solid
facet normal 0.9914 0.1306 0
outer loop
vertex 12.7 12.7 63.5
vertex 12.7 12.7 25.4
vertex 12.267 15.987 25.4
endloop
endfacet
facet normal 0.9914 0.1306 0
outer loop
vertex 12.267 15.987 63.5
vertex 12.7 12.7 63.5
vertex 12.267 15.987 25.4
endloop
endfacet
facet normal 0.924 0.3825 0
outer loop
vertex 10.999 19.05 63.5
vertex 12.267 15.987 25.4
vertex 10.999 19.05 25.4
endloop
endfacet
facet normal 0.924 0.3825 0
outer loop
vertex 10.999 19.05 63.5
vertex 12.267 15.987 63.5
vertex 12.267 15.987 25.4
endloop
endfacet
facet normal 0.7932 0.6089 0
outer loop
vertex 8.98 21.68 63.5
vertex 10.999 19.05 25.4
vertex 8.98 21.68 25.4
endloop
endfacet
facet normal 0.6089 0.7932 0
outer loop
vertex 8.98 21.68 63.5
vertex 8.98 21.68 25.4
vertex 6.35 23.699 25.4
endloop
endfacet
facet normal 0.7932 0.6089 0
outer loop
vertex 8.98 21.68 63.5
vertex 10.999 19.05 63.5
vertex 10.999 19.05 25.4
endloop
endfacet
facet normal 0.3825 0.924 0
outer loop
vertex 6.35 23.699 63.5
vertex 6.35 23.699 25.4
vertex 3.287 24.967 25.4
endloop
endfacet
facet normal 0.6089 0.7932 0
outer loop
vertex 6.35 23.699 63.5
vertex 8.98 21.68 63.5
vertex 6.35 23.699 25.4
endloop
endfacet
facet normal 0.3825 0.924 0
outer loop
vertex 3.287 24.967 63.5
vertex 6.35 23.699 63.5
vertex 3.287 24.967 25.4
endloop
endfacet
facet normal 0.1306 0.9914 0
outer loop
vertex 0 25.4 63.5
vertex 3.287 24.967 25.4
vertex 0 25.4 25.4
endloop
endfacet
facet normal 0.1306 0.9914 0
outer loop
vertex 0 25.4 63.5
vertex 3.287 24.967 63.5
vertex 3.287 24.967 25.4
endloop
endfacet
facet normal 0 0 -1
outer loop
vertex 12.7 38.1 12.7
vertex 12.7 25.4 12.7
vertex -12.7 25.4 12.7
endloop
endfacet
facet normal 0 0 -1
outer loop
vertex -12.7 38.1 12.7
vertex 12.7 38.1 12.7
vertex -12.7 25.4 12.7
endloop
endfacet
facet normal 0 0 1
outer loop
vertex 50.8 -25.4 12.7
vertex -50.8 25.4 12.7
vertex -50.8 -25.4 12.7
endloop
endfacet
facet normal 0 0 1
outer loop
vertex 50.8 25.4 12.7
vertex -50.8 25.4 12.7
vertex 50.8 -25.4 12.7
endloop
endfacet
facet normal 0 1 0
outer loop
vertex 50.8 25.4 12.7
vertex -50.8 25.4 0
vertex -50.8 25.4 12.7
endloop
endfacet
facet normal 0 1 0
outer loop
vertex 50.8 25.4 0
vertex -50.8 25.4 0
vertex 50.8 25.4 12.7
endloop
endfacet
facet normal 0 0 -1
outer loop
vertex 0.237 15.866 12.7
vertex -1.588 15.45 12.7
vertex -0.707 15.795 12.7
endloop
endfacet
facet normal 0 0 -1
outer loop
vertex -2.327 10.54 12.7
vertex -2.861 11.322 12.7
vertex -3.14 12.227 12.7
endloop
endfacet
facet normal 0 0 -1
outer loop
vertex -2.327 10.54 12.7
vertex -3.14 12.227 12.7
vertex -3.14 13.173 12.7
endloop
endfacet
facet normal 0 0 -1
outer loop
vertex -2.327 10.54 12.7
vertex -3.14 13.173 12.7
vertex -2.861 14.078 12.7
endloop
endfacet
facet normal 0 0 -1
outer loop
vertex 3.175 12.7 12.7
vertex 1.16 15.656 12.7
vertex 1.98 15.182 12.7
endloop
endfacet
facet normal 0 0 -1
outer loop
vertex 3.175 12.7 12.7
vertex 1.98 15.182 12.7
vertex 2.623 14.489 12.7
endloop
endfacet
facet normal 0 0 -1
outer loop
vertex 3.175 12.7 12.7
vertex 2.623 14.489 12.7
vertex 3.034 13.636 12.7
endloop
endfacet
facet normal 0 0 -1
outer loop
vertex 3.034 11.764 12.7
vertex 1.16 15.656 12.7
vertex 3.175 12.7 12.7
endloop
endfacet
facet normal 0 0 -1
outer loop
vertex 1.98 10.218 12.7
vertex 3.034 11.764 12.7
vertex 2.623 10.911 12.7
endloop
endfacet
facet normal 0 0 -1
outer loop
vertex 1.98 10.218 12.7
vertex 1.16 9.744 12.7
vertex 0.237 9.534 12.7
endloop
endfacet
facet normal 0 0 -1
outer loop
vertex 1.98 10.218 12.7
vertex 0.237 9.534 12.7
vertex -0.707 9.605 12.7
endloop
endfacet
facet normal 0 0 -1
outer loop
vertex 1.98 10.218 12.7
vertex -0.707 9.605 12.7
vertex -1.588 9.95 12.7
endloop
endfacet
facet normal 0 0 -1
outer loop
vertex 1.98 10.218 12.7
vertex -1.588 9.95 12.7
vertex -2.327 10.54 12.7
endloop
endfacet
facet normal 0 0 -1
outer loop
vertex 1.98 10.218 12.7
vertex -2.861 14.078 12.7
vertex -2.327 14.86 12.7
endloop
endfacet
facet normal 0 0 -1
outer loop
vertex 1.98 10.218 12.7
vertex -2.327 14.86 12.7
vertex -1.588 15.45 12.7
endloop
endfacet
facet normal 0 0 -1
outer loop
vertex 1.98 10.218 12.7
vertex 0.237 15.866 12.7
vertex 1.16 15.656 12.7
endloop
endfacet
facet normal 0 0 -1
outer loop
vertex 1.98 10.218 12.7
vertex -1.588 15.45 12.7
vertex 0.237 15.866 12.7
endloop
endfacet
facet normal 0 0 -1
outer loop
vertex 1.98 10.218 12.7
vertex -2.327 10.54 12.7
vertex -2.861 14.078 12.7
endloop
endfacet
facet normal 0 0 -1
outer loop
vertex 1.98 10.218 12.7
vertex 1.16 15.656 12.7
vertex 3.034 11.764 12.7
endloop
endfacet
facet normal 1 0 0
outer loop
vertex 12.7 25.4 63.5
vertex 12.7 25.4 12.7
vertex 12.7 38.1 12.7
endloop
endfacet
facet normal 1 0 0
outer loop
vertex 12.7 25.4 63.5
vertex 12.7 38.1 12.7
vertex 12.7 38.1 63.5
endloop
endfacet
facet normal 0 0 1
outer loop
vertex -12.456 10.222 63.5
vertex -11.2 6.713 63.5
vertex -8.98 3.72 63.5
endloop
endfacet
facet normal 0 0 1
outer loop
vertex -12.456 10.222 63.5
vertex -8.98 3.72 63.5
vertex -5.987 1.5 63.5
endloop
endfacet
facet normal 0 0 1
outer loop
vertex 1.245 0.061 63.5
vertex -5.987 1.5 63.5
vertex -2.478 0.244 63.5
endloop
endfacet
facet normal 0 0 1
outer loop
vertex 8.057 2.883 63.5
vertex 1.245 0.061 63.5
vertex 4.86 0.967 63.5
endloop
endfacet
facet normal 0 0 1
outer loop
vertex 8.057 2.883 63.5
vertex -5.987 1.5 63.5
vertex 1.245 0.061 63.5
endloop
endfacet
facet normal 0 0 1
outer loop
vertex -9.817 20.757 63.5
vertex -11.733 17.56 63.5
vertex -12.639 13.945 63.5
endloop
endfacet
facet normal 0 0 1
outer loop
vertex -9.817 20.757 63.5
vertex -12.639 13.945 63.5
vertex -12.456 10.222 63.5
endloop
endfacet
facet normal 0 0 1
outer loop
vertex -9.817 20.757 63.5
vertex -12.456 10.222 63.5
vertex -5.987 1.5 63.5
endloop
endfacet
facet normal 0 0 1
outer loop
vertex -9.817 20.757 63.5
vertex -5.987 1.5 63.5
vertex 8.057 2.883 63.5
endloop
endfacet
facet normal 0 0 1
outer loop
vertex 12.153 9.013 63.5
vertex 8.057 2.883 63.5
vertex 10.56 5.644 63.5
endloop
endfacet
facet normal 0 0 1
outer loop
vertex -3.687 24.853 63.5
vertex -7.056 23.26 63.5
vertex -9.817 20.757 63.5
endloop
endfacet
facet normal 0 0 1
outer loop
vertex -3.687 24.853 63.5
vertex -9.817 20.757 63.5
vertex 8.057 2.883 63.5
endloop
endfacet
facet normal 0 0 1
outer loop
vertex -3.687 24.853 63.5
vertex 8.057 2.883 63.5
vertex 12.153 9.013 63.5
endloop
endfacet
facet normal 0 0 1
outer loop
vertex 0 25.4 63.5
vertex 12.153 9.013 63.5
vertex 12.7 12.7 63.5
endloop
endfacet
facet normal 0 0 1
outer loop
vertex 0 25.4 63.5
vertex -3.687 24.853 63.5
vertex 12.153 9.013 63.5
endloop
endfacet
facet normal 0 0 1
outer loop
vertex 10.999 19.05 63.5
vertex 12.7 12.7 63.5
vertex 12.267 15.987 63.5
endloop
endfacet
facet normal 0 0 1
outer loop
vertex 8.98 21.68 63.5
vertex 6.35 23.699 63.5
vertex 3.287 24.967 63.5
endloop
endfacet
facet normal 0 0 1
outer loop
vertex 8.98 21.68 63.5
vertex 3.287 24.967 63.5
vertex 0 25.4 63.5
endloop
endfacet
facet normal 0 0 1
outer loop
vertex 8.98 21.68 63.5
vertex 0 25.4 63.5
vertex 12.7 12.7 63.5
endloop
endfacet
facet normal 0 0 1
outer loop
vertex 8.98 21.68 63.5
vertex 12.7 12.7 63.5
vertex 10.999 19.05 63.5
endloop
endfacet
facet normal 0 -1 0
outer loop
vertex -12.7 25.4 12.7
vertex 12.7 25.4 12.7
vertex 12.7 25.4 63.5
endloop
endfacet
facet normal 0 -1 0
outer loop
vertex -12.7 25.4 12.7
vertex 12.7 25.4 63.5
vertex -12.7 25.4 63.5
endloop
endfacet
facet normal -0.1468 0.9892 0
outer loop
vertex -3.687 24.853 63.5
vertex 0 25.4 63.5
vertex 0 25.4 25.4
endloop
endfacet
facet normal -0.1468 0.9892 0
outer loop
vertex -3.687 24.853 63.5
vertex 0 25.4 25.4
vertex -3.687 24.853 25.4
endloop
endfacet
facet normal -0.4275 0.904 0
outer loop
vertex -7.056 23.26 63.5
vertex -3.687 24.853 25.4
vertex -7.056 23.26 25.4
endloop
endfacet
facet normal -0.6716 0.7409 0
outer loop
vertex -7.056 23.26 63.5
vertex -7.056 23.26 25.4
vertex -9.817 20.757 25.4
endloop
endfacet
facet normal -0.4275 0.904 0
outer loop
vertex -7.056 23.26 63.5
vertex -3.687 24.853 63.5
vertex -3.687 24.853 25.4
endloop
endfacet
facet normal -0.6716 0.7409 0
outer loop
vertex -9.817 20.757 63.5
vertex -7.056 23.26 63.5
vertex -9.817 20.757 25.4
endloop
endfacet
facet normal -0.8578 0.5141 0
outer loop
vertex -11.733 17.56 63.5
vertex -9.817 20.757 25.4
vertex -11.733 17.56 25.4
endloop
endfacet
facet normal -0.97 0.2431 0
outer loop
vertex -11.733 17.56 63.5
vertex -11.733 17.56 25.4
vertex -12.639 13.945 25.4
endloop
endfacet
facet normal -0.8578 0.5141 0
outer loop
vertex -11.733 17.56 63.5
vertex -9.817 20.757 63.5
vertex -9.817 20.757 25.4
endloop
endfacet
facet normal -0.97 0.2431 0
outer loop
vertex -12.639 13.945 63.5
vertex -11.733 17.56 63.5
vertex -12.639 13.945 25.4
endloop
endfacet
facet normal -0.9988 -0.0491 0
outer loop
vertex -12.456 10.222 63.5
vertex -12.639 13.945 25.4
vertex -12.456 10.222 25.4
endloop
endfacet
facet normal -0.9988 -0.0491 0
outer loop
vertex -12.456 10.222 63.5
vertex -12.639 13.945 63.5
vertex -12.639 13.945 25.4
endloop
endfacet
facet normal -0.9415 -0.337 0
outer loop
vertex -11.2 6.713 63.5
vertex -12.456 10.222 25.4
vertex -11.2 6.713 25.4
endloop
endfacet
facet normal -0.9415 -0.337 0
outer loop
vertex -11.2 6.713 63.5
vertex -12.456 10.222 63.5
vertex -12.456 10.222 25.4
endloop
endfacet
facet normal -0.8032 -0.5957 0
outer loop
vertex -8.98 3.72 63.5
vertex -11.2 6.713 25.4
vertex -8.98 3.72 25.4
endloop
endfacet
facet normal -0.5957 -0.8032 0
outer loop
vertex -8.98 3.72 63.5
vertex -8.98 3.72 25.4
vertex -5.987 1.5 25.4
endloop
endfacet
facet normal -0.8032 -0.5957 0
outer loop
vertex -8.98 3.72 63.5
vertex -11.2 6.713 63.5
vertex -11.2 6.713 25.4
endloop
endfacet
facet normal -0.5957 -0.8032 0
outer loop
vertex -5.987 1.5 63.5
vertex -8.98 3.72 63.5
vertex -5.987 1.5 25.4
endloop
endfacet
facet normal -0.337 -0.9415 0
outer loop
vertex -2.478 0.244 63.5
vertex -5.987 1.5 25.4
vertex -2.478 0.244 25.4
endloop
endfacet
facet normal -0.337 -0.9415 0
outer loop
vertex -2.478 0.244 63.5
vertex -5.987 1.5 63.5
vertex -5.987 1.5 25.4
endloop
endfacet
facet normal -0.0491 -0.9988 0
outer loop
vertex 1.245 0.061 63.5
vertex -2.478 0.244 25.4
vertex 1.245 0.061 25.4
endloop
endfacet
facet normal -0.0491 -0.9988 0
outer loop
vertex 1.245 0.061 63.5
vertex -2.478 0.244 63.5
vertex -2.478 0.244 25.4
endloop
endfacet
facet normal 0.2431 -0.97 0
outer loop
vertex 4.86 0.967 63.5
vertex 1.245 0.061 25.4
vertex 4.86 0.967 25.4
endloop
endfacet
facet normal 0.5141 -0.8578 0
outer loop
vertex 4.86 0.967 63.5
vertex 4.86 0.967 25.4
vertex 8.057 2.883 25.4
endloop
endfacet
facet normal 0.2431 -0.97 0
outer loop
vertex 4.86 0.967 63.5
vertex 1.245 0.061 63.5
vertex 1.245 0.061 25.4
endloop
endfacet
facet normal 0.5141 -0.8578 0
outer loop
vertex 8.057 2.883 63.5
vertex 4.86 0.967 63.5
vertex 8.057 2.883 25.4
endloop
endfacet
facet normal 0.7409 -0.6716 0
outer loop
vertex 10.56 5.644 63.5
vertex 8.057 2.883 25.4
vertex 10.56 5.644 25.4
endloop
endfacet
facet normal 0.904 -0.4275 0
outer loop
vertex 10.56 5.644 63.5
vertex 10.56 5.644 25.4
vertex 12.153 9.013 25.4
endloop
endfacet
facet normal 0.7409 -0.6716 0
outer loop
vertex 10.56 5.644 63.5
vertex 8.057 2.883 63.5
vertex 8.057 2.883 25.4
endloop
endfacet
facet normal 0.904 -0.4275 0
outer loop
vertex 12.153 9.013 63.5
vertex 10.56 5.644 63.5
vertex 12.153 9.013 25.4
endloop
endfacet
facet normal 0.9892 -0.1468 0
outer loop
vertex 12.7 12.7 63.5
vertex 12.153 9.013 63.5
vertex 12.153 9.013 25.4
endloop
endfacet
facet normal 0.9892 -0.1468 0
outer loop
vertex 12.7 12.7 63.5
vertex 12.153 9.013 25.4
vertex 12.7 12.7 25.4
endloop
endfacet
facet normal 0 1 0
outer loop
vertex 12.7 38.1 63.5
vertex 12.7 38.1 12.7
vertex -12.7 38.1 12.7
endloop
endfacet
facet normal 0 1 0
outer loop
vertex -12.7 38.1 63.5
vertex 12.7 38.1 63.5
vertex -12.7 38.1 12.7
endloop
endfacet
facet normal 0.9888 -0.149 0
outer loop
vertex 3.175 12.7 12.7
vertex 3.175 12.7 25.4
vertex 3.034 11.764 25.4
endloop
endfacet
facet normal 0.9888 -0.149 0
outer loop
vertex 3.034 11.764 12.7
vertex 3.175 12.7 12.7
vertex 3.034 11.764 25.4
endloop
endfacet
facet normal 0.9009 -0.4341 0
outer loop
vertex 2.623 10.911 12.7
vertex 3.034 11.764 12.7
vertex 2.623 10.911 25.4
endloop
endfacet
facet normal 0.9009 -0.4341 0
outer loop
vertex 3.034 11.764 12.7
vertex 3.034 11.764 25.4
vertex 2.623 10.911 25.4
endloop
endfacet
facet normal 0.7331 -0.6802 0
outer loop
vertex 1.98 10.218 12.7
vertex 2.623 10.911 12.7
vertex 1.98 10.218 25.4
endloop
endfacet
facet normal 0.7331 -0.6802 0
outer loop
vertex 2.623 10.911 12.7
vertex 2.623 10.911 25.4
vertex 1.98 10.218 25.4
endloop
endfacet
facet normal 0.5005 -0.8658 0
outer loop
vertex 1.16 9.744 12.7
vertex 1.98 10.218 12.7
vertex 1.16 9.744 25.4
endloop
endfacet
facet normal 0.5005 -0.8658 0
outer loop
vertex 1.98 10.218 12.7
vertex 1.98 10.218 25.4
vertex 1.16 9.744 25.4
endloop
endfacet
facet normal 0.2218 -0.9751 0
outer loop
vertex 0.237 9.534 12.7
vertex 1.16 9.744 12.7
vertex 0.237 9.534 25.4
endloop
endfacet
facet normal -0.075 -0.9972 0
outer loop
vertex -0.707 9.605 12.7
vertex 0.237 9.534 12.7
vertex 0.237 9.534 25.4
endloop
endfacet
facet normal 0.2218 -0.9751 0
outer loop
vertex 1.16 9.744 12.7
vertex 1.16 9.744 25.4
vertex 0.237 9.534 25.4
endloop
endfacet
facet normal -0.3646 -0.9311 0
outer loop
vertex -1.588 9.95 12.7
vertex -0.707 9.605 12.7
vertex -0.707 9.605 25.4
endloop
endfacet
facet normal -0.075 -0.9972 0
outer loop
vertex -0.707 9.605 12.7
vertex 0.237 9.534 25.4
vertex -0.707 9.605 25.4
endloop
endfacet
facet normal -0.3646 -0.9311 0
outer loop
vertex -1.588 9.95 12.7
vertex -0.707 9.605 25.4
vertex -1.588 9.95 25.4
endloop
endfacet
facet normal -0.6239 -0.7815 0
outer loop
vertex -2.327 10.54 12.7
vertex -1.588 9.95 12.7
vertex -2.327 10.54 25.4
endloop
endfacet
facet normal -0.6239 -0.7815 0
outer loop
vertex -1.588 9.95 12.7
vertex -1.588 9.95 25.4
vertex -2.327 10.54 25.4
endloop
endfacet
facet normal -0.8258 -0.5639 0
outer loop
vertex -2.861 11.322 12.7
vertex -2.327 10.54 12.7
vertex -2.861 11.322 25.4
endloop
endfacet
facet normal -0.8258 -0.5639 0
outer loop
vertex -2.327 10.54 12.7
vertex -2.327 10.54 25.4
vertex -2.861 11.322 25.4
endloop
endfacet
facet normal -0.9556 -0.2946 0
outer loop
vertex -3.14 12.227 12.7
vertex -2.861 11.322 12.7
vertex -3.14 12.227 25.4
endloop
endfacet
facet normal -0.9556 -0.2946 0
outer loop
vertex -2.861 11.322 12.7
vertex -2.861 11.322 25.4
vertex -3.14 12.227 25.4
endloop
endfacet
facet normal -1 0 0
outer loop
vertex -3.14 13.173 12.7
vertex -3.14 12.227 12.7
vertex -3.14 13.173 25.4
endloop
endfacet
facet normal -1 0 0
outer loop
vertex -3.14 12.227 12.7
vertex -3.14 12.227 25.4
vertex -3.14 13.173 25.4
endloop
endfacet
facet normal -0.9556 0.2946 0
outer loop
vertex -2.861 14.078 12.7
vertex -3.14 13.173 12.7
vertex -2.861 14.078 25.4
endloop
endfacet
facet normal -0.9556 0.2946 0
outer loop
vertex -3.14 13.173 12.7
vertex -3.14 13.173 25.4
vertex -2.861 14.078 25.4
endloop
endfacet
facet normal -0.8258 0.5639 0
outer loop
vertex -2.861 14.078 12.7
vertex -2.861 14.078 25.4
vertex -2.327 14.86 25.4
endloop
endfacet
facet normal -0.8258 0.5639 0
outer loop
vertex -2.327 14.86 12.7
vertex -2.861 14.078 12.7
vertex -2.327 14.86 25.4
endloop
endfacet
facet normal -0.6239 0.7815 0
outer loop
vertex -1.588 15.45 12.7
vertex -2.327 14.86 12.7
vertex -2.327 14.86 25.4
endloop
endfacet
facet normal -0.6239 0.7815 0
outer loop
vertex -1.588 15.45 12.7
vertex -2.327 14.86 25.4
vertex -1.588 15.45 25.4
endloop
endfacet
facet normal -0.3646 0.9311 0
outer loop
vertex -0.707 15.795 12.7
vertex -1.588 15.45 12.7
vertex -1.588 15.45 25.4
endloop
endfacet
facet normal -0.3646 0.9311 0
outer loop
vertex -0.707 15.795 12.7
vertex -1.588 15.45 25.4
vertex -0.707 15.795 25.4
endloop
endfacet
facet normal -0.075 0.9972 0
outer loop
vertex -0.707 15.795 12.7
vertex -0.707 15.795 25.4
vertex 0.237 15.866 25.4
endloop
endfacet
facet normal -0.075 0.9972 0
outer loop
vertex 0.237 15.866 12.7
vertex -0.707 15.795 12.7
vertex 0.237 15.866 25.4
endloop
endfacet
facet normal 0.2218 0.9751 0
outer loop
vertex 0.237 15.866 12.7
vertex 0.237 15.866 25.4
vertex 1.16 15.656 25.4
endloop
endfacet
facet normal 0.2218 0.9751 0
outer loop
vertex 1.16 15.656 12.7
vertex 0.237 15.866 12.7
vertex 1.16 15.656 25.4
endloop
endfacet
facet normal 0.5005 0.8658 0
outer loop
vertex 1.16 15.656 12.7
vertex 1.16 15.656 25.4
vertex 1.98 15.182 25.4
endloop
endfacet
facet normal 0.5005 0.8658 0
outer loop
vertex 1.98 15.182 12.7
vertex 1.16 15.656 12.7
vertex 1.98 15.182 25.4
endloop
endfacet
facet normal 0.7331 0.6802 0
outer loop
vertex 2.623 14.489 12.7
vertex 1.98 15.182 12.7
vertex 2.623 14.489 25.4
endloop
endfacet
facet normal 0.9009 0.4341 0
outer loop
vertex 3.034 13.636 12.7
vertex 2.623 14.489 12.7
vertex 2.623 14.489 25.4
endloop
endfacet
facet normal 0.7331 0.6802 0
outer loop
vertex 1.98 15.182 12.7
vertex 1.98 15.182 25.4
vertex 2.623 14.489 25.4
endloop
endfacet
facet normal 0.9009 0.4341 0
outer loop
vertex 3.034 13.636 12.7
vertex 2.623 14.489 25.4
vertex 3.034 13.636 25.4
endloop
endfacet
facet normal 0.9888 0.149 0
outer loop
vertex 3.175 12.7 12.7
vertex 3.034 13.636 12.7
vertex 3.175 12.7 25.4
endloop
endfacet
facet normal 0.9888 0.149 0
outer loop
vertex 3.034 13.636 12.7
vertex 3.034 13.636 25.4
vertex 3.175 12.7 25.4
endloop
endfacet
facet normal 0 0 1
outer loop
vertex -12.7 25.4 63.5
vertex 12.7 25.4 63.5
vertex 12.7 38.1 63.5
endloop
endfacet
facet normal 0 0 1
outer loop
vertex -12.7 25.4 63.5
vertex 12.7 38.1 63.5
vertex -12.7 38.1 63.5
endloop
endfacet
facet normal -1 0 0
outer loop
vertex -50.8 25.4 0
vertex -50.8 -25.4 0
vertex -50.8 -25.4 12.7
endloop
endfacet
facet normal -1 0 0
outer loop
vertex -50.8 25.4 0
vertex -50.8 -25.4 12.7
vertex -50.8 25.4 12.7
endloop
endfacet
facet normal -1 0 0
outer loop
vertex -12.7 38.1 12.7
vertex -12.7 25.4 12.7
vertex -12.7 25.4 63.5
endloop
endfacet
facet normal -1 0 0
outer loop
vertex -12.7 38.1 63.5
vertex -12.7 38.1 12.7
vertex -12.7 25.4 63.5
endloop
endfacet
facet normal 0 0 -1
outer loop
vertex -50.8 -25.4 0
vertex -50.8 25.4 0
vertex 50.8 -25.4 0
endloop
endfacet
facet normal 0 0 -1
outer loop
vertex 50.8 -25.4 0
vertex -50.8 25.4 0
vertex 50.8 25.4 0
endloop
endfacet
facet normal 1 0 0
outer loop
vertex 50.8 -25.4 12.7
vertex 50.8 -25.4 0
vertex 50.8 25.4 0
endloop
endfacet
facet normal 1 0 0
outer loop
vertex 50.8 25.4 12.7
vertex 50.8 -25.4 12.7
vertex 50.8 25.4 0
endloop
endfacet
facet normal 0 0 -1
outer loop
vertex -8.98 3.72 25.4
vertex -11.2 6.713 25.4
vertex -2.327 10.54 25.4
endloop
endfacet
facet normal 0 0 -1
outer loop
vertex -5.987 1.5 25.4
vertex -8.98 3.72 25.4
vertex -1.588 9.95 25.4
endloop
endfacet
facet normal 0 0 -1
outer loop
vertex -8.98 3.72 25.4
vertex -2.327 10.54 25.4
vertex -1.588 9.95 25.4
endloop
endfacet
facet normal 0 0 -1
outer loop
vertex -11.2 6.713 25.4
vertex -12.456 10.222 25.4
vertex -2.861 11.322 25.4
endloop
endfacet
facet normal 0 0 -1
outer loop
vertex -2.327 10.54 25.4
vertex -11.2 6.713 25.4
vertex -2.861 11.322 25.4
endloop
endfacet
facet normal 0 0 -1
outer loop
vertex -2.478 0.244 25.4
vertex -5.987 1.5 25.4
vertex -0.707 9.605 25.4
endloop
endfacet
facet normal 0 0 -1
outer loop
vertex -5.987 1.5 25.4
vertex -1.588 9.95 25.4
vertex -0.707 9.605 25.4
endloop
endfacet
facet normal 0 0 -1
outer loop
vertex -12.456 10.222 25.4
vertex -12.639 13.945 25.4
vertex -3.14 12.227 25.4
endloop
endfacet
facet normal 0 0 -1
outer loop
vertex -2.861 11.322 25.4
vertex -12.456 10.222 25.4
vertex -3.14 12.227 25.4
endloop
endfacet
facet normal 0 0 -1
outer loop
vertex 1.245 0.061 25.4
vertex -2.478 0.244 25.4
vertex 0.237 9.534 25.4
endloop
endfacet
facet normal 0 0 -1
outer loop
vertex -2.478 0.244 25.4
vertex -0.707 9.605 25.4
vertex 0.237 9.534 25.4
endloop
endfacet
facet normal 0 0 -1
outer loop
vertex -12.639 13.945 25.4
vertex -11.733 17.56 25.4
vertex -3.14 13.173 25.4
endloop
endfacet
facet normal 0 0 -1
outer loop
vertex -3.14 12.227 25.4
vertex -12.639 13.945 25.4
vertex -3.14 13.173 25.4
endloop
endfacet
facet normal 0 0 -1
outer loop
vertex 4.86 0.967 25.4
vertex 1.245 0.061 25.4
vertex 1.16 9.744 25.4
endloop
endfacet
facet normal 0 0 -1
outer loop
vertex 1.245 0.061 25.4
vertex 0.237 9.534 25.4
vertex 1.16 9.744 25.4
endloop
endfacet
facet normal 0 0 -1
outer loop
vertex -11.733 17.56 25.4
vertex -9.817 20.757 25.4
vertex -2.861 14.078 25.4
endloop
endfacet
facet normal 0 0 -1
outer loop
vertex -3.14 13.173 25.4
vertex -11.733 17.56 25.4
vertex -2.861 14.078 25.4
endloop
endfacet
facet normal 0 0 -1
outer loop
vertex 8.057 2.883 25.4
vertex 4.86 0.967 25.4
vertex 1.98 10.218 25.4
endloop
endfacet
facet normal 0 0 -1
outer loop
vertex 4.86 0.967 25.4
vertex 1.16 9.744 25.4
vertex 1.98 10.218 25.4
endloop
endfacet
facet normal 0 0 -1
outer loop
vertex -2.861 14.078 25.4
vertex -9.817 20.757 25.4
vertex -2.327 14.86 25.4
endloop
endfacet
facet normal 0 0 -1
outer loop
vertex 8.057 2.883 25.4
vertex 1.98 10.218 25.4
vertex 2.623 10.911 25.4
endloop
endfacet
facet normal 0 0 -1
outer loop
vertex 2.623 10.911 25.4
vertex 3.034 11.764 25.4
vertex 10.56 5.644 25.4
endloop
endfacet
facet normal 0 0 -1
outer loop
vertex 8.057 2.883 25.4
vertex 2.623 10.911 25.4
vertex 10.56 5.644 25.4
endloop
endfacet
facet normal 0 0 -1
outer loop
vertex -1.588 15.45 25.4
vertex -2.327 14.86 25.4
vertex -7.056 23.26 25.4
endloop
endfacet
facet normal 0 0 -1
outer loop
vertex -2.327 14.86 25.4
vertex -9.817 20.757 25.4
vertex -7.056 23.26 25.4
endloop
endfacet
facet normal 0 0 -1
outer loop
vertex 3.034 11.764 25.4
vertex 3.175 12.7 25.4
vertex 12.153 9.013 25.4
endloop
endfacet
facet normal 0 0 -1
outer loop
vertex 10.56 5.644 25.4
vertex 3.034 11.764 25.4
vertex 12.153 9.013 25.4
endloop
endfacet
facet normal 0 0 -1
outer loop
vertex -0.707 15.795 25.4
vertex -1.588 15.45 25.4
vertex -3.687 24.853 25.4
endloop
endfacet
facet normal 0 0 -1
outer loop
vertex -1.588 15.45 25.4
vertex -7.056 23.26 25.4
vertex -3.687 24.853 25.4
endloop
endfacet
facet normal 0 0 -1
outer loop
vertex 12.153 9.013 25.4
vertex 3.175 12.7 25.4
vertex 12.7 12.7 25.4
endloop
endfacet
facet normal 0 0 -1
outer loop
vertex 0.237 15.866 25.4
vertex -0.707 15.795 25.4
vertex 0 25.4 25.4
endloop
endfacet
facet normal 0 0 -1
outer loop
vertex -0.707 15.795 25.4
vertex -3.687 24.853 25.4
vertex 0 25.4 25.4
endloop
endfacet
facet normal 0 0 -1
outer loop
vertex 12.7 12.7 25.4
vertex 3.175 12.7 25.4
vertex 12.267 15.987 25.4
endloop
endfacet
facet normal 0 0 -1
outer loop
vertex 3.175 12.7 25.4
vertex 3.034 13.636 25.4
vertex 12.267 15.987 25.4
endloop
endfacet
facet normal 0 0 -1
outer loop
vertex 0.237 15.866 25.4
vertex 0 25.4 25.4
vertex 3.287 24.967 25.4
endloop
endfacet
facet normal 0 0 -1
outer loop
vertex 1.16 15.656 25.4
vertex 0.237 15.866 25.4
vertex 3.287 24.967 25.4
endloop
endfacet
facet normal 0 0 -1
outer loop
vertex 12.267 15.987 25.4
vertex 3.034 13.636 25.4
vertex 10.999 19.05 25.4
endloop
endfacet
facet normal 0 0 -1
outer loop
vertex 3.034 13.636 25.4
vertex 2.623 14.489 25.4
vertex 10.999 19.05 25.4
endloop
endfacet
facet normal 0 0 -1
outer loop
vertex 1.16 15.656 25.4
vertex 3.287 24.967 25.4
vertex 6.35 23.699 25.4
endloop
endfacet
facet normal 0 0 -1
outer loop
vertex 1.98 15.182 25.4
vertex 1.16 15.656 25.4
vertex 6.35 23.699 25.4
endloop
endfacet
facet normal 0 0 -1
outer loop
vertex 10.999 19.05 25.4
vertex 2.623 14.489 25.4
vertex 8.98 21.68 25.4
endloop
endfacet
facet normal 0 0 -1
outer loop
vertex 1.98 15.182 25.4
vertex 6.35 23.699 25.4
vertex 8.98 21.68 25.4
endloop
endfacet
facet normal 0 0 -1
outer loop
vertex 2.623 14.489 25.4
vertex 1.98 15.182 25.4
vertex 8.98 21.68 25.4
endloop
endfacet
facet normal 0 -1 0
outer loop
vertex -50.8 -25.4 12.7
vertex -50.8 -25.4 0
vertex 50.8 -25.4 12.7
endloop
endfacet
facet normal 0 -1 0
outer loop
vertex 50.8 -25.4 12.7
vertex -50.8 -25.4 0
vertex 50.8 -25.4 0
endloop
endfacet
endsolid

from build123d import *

# Parameters (mm, degrees)
F0_W     = 101.6
F0_H     = 50.8
F1_DEPTH = 12.7
F2_W     = 25.4
F2_H     = 50.8
F3_DEPTH = 12.7
F5_DEPTH = 38.1
F6_R     = 3.175
F7_DEPTH = 12.7


with BuildPart() as f1:
    # F0 (on Top) → F1 (new body)
    with BuildSketch(Plane.XY):
        Rectangle(F0_W, F0_H)
    extrude(amount=F1_DEPTH)


with BuildPart() as f3:
    # F2 (on face) → F3 (new body)
    with BuildSketch(Plane(origin=(0, 25.4, 0), x_dir=(-1, 0, 0), z_dir=(0, 1, 0))):
        with Locations((0, 38.1)):
            Rectangle(F2_W, F2_H)
    extrude(amount=F3_DEPTH)


with BuildPart() as f5:
    # F4 (on face) → F5 (new body)
    with BuildSketch(Plane.XY.offset(63.5)):
        with BuildLine():
            ThreePointArc((1.16e-08, 25.4), (-8.9802561252, 3.719743883), (12.7, 12.7))
            ThreePointArc((12.7, 12.7), (8.9802561252, 21.680256117), (1.16e-08, 25.4))
        make_face()
    extrude(amount=-F5_DEPTH)

    # F6 (on face) → F7 (join)
    with BuildSketch(Plane(origin=(0, 0, 25.4), x_dir=(1, 0, 0), z_dir=(0, 0, -1))):
        with Locations((0, -12.7)):
            Circle(F6_R)
    extrude(amount=F7_DEPTH)


solid = Compound([f1.part, f3.part, f5.part])
